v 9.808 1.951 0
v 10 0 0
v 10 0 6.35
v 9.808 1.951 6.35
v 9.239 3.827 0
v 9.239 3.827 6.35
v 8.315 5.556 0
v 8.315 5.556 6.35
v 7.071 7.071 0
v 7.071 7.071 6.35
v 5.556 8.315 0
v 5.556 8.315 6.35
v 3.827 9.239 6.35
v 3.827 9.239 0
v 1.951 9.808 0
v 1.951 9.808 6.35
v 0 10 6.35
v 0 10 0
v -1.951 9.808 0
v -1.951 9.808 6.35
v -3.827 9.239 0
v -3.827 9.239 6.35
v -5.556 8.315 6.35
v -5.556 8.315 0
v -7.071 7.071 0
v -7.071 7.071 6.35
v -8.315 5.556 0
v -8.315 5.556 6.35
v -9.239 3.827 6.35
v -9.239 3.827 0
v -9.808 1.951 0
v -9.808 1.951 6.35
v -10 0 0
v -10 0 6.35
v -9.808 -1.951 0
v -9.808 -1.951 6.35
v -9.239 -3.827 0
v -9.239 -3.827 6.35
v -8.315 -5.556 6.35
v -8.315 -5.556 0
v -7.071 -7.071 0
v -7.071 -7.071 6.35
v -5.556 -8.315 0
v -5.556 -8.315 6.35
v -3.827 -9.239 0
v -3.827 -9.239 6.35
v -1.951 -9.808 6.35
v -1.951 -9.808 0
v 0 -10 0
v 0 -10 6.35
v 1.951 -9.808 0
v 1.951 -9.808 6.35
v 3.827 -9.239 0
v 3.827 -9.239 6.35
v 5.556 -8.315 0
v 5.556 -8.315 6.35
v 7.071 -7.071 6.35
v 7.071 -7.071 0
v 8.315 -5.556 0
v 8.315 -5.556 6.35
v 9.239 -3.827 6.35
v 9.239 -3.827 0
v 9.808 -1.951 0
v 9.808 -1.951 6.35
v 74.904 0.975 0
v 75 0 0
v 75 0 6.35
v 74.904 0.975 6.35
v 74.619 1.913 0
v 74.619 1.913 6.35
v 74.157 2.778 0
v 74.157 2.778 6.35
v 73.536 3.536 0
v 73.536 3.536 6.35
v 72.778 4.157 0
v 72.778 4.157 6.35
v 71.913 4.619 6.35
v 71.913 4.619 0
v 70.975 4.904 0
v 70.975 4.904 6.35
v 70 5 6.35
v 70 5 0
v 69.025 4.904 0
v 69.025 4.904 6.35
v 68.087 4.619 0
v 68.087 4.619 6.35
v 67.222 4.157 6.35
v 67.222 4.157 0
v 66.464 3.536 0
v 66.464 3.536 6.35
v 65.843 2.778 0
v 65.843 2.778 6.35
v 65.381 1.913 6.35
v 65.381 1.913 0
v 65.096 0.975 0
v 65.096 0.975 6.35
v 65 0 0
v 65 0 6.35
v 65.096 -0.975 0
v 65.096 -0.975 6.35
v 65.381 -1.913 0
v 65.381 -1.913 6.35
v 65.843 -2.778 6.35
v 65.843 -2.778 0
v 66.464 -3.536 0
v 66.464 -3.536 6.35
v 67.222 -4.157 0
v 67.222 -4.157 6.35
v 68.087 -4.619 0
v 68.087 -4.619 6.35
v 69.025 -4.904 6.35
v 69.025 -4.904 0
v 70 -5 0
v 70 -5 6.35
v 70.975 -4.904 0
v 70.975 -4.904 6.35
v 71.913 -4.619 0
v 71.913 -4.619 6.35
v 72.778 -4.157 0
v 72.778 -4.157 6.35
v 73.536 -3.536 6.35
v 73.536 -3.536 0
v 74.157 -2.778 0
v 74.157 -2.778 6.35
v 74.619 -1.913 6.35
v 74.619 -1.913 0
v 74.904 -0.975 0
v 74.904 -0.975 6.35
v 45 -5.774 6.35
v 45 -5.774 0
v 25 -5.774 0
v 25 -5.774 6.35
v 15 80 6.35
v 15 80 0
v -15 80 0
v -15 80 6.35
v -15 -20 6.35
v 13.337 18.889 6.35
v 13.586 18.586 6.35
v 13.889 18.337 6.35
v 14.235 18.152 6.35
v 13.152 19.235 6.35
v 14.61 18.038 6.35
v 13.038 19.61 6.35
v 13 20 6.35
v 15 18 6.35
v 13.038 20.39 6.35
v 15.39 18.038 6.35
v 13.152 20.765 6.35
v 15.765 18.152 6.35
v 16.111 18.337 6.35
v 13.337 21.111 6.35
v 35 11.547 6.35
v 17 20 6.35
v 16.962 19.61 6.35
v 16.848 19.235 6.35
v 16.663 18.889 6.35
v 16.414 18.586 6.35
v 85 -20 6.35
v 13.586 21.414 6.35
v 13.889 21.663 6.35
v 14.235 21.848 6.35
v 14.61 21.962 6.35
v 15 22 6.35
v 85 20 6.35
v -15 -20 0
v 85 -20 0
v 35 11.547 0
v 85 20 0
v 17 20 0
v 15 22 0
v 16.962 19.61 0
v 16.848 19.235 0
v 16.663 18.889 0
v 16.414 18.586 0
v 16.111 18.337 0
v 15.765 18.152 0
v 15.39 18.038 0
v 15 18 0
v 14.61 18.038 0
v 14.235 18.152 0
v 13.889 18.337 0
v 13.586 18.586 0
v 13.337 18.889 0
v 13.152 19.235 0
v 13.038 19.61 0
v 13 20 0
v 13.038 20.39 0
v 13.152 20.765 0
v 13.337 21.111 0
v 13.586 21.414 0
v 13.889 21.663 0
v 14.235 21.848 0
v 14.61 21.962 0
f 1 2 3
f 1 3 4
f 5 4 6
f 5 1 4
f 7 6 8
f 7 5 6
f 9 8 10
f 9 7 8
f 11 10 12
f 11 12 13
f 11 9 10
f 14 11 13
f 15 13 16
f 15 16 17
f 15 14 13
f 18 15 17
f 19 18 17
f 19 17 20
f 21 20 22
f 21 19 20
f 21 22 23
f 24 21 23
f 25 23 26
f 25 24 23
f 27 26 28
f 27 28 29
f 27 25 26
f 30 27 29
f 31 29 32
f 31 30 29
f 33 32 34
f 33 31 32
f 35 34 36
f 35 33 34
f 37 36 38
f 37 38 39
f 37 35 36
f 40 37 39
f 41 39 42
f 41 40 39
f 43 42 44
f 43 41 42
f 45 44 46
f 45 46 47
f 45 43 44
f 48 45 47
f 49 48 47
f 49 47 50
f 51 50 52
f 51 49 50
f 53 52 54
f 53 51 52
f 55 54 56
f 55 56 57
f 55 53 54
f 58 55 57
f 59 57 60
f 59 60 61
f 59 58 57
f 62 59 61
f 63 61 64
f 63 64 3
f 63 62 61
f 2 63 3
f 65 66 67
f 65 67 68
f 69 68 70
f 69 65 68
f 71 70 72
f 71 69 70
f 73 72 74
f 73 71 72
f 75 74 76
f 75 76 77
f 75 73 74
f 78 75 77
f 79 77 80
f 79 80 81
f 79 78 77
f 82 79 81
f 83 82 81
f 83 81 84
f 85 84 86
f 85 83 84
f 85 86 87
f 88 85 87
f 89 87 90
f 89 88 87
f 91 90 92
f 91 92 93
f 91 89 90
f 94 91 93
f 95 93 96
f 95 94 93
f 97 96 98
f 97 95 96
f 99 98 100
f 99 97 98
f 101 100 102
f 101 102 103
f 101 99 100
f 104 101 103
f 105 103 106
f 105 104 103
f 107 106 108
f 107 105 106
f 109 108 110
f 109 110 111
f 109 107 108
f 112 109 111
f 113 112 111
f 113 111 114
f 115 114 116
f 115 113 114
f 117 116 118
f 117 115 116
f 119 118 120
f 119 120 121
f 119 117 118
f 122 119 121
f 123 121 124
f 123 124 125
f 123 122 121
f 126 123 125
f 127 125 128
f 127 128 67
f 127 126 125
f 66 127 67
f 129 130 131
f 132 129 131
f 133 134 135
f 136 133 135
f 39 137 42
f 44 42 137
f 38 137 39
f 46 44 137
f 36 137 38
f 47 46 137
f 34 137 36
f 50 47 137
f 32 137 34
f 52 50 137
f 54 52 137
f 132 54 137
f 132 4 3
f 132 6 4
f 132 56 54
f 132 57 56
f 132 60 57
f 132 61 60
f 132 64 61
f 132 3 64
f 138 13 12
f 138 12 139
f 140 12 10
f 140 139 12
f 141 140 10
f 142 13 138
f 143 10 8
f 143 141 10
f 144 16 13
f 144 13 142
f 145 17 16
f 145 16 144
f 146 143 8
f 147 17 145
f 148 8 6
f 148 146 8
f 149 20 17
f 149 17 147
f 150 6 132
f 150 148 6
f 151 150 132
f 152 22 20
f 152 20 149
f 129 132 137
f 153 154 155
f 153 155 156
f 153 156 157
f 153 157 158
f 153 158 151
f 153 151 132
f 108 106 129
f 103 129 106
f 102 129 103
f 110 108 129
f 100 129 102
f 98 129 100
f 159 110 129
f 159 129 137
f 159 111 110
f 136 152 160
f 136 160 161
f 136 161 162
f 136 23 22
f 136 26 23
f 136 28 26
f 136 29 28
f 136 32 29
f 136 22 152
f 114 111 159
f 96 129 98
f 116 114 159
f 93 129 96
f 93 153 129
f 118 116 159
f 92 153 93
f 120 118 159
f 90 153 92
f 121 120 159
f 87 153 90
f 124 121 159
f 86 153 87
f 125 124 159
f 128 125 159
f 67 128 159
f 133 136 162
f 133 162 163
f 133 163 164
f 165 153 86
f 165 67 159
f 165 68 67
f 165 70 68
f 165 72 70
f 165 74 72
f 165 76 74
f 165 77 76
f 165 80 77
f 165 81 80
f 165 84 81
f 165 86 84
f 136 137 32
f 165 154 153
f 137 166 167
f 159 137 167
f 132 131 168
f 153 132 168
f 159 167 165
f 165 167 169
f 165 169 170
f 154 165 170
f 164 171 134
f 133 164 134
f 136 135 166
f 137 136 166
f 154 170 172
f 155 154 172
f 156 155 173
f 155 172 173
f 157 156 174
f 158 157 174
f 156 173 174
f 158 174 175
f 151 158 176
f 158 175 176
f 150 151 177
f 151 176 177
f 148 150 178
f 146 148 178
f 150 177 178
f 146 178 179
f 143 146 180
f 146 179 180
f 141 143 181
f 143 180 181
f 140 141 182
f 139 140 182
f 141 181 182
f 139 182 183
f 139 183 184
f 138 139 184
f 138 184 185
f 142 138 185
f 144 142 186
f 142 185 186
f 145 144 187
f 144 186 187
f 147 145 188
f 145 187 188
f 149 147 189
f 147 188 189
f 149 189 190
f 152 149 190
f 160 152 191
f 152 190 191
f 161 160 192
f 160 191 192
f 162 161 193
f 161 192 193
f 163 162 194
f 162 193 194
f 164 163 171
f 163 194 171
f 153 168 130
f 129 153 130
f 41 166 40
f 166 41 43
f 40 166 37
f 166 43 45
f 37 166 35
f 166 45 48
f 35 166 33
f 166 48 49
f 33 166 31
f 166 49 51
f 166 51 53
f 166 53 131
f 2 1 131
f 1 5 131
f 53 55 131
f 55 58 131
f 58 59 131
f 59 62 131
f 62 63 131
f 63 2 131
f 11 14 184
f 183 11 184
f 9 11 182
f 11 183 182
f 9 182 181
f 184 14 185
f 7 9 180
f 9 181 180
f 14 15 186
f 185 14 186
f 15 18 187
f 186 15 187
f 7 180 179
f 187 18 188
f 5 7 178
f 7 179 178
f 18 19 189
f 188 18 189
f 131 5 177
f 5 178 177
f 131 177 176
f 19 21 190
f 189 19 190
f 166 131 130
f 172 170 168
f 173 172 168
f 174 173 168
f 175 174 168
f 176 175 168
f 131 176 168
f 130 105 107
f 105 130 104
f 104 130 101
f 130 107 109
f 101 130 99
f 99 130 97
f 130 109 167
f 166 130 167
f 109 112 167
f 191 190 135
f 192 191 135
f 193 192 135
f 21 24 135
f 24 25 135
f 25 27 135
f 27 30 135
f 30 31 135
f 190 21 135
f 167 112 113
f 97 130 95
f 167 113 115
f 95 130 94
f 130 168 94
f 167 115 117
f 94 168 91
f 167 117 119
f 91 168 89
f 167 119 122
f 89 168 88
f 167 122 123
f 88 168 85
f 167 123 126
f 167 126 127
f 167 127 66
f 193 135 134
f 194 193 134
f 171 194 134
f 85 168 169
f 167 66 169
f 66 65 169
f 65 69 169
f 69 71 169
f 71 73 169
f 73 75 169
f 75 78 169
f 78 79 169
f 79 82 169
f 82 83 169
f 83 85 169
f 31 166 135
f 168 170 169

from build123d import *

# Parameters (mm, degrees)
F0_R     = 10
F0_R_2   = 5
F1_DEPTH = 6.35


with BuildPart() as f1:
    # F0 (on Top) → F1 (new body)
    with BuildSketch(Plane.XY):
        with BuildLine():
            Line((15, 22), (15, 80))
            Line((15, 80), (-15, 80))
            Line((-15, 80), (-15, -20))
            Line((-15, -20), (85, -20))
            Line((85, -20), (85, 20))
            Line((85, 20), (17, 20))
            ThreePointArc((17, 20), (13.585786, 18.585786), (15, 22))
        make_face()
        Circle(F0_R, mode=Mode.SUBTRACT)
        Polygon((25, -5.773503), (35, 11.547005), (45, -5.773503), align=None, mode=Mode.SUBTRACT)
        with Locations((70, 0)):
            Circle(F0_R_2, mode=Mode.SUBTRACT)
    extrude(amount=F1_DEPTH)


solid = f1.part
